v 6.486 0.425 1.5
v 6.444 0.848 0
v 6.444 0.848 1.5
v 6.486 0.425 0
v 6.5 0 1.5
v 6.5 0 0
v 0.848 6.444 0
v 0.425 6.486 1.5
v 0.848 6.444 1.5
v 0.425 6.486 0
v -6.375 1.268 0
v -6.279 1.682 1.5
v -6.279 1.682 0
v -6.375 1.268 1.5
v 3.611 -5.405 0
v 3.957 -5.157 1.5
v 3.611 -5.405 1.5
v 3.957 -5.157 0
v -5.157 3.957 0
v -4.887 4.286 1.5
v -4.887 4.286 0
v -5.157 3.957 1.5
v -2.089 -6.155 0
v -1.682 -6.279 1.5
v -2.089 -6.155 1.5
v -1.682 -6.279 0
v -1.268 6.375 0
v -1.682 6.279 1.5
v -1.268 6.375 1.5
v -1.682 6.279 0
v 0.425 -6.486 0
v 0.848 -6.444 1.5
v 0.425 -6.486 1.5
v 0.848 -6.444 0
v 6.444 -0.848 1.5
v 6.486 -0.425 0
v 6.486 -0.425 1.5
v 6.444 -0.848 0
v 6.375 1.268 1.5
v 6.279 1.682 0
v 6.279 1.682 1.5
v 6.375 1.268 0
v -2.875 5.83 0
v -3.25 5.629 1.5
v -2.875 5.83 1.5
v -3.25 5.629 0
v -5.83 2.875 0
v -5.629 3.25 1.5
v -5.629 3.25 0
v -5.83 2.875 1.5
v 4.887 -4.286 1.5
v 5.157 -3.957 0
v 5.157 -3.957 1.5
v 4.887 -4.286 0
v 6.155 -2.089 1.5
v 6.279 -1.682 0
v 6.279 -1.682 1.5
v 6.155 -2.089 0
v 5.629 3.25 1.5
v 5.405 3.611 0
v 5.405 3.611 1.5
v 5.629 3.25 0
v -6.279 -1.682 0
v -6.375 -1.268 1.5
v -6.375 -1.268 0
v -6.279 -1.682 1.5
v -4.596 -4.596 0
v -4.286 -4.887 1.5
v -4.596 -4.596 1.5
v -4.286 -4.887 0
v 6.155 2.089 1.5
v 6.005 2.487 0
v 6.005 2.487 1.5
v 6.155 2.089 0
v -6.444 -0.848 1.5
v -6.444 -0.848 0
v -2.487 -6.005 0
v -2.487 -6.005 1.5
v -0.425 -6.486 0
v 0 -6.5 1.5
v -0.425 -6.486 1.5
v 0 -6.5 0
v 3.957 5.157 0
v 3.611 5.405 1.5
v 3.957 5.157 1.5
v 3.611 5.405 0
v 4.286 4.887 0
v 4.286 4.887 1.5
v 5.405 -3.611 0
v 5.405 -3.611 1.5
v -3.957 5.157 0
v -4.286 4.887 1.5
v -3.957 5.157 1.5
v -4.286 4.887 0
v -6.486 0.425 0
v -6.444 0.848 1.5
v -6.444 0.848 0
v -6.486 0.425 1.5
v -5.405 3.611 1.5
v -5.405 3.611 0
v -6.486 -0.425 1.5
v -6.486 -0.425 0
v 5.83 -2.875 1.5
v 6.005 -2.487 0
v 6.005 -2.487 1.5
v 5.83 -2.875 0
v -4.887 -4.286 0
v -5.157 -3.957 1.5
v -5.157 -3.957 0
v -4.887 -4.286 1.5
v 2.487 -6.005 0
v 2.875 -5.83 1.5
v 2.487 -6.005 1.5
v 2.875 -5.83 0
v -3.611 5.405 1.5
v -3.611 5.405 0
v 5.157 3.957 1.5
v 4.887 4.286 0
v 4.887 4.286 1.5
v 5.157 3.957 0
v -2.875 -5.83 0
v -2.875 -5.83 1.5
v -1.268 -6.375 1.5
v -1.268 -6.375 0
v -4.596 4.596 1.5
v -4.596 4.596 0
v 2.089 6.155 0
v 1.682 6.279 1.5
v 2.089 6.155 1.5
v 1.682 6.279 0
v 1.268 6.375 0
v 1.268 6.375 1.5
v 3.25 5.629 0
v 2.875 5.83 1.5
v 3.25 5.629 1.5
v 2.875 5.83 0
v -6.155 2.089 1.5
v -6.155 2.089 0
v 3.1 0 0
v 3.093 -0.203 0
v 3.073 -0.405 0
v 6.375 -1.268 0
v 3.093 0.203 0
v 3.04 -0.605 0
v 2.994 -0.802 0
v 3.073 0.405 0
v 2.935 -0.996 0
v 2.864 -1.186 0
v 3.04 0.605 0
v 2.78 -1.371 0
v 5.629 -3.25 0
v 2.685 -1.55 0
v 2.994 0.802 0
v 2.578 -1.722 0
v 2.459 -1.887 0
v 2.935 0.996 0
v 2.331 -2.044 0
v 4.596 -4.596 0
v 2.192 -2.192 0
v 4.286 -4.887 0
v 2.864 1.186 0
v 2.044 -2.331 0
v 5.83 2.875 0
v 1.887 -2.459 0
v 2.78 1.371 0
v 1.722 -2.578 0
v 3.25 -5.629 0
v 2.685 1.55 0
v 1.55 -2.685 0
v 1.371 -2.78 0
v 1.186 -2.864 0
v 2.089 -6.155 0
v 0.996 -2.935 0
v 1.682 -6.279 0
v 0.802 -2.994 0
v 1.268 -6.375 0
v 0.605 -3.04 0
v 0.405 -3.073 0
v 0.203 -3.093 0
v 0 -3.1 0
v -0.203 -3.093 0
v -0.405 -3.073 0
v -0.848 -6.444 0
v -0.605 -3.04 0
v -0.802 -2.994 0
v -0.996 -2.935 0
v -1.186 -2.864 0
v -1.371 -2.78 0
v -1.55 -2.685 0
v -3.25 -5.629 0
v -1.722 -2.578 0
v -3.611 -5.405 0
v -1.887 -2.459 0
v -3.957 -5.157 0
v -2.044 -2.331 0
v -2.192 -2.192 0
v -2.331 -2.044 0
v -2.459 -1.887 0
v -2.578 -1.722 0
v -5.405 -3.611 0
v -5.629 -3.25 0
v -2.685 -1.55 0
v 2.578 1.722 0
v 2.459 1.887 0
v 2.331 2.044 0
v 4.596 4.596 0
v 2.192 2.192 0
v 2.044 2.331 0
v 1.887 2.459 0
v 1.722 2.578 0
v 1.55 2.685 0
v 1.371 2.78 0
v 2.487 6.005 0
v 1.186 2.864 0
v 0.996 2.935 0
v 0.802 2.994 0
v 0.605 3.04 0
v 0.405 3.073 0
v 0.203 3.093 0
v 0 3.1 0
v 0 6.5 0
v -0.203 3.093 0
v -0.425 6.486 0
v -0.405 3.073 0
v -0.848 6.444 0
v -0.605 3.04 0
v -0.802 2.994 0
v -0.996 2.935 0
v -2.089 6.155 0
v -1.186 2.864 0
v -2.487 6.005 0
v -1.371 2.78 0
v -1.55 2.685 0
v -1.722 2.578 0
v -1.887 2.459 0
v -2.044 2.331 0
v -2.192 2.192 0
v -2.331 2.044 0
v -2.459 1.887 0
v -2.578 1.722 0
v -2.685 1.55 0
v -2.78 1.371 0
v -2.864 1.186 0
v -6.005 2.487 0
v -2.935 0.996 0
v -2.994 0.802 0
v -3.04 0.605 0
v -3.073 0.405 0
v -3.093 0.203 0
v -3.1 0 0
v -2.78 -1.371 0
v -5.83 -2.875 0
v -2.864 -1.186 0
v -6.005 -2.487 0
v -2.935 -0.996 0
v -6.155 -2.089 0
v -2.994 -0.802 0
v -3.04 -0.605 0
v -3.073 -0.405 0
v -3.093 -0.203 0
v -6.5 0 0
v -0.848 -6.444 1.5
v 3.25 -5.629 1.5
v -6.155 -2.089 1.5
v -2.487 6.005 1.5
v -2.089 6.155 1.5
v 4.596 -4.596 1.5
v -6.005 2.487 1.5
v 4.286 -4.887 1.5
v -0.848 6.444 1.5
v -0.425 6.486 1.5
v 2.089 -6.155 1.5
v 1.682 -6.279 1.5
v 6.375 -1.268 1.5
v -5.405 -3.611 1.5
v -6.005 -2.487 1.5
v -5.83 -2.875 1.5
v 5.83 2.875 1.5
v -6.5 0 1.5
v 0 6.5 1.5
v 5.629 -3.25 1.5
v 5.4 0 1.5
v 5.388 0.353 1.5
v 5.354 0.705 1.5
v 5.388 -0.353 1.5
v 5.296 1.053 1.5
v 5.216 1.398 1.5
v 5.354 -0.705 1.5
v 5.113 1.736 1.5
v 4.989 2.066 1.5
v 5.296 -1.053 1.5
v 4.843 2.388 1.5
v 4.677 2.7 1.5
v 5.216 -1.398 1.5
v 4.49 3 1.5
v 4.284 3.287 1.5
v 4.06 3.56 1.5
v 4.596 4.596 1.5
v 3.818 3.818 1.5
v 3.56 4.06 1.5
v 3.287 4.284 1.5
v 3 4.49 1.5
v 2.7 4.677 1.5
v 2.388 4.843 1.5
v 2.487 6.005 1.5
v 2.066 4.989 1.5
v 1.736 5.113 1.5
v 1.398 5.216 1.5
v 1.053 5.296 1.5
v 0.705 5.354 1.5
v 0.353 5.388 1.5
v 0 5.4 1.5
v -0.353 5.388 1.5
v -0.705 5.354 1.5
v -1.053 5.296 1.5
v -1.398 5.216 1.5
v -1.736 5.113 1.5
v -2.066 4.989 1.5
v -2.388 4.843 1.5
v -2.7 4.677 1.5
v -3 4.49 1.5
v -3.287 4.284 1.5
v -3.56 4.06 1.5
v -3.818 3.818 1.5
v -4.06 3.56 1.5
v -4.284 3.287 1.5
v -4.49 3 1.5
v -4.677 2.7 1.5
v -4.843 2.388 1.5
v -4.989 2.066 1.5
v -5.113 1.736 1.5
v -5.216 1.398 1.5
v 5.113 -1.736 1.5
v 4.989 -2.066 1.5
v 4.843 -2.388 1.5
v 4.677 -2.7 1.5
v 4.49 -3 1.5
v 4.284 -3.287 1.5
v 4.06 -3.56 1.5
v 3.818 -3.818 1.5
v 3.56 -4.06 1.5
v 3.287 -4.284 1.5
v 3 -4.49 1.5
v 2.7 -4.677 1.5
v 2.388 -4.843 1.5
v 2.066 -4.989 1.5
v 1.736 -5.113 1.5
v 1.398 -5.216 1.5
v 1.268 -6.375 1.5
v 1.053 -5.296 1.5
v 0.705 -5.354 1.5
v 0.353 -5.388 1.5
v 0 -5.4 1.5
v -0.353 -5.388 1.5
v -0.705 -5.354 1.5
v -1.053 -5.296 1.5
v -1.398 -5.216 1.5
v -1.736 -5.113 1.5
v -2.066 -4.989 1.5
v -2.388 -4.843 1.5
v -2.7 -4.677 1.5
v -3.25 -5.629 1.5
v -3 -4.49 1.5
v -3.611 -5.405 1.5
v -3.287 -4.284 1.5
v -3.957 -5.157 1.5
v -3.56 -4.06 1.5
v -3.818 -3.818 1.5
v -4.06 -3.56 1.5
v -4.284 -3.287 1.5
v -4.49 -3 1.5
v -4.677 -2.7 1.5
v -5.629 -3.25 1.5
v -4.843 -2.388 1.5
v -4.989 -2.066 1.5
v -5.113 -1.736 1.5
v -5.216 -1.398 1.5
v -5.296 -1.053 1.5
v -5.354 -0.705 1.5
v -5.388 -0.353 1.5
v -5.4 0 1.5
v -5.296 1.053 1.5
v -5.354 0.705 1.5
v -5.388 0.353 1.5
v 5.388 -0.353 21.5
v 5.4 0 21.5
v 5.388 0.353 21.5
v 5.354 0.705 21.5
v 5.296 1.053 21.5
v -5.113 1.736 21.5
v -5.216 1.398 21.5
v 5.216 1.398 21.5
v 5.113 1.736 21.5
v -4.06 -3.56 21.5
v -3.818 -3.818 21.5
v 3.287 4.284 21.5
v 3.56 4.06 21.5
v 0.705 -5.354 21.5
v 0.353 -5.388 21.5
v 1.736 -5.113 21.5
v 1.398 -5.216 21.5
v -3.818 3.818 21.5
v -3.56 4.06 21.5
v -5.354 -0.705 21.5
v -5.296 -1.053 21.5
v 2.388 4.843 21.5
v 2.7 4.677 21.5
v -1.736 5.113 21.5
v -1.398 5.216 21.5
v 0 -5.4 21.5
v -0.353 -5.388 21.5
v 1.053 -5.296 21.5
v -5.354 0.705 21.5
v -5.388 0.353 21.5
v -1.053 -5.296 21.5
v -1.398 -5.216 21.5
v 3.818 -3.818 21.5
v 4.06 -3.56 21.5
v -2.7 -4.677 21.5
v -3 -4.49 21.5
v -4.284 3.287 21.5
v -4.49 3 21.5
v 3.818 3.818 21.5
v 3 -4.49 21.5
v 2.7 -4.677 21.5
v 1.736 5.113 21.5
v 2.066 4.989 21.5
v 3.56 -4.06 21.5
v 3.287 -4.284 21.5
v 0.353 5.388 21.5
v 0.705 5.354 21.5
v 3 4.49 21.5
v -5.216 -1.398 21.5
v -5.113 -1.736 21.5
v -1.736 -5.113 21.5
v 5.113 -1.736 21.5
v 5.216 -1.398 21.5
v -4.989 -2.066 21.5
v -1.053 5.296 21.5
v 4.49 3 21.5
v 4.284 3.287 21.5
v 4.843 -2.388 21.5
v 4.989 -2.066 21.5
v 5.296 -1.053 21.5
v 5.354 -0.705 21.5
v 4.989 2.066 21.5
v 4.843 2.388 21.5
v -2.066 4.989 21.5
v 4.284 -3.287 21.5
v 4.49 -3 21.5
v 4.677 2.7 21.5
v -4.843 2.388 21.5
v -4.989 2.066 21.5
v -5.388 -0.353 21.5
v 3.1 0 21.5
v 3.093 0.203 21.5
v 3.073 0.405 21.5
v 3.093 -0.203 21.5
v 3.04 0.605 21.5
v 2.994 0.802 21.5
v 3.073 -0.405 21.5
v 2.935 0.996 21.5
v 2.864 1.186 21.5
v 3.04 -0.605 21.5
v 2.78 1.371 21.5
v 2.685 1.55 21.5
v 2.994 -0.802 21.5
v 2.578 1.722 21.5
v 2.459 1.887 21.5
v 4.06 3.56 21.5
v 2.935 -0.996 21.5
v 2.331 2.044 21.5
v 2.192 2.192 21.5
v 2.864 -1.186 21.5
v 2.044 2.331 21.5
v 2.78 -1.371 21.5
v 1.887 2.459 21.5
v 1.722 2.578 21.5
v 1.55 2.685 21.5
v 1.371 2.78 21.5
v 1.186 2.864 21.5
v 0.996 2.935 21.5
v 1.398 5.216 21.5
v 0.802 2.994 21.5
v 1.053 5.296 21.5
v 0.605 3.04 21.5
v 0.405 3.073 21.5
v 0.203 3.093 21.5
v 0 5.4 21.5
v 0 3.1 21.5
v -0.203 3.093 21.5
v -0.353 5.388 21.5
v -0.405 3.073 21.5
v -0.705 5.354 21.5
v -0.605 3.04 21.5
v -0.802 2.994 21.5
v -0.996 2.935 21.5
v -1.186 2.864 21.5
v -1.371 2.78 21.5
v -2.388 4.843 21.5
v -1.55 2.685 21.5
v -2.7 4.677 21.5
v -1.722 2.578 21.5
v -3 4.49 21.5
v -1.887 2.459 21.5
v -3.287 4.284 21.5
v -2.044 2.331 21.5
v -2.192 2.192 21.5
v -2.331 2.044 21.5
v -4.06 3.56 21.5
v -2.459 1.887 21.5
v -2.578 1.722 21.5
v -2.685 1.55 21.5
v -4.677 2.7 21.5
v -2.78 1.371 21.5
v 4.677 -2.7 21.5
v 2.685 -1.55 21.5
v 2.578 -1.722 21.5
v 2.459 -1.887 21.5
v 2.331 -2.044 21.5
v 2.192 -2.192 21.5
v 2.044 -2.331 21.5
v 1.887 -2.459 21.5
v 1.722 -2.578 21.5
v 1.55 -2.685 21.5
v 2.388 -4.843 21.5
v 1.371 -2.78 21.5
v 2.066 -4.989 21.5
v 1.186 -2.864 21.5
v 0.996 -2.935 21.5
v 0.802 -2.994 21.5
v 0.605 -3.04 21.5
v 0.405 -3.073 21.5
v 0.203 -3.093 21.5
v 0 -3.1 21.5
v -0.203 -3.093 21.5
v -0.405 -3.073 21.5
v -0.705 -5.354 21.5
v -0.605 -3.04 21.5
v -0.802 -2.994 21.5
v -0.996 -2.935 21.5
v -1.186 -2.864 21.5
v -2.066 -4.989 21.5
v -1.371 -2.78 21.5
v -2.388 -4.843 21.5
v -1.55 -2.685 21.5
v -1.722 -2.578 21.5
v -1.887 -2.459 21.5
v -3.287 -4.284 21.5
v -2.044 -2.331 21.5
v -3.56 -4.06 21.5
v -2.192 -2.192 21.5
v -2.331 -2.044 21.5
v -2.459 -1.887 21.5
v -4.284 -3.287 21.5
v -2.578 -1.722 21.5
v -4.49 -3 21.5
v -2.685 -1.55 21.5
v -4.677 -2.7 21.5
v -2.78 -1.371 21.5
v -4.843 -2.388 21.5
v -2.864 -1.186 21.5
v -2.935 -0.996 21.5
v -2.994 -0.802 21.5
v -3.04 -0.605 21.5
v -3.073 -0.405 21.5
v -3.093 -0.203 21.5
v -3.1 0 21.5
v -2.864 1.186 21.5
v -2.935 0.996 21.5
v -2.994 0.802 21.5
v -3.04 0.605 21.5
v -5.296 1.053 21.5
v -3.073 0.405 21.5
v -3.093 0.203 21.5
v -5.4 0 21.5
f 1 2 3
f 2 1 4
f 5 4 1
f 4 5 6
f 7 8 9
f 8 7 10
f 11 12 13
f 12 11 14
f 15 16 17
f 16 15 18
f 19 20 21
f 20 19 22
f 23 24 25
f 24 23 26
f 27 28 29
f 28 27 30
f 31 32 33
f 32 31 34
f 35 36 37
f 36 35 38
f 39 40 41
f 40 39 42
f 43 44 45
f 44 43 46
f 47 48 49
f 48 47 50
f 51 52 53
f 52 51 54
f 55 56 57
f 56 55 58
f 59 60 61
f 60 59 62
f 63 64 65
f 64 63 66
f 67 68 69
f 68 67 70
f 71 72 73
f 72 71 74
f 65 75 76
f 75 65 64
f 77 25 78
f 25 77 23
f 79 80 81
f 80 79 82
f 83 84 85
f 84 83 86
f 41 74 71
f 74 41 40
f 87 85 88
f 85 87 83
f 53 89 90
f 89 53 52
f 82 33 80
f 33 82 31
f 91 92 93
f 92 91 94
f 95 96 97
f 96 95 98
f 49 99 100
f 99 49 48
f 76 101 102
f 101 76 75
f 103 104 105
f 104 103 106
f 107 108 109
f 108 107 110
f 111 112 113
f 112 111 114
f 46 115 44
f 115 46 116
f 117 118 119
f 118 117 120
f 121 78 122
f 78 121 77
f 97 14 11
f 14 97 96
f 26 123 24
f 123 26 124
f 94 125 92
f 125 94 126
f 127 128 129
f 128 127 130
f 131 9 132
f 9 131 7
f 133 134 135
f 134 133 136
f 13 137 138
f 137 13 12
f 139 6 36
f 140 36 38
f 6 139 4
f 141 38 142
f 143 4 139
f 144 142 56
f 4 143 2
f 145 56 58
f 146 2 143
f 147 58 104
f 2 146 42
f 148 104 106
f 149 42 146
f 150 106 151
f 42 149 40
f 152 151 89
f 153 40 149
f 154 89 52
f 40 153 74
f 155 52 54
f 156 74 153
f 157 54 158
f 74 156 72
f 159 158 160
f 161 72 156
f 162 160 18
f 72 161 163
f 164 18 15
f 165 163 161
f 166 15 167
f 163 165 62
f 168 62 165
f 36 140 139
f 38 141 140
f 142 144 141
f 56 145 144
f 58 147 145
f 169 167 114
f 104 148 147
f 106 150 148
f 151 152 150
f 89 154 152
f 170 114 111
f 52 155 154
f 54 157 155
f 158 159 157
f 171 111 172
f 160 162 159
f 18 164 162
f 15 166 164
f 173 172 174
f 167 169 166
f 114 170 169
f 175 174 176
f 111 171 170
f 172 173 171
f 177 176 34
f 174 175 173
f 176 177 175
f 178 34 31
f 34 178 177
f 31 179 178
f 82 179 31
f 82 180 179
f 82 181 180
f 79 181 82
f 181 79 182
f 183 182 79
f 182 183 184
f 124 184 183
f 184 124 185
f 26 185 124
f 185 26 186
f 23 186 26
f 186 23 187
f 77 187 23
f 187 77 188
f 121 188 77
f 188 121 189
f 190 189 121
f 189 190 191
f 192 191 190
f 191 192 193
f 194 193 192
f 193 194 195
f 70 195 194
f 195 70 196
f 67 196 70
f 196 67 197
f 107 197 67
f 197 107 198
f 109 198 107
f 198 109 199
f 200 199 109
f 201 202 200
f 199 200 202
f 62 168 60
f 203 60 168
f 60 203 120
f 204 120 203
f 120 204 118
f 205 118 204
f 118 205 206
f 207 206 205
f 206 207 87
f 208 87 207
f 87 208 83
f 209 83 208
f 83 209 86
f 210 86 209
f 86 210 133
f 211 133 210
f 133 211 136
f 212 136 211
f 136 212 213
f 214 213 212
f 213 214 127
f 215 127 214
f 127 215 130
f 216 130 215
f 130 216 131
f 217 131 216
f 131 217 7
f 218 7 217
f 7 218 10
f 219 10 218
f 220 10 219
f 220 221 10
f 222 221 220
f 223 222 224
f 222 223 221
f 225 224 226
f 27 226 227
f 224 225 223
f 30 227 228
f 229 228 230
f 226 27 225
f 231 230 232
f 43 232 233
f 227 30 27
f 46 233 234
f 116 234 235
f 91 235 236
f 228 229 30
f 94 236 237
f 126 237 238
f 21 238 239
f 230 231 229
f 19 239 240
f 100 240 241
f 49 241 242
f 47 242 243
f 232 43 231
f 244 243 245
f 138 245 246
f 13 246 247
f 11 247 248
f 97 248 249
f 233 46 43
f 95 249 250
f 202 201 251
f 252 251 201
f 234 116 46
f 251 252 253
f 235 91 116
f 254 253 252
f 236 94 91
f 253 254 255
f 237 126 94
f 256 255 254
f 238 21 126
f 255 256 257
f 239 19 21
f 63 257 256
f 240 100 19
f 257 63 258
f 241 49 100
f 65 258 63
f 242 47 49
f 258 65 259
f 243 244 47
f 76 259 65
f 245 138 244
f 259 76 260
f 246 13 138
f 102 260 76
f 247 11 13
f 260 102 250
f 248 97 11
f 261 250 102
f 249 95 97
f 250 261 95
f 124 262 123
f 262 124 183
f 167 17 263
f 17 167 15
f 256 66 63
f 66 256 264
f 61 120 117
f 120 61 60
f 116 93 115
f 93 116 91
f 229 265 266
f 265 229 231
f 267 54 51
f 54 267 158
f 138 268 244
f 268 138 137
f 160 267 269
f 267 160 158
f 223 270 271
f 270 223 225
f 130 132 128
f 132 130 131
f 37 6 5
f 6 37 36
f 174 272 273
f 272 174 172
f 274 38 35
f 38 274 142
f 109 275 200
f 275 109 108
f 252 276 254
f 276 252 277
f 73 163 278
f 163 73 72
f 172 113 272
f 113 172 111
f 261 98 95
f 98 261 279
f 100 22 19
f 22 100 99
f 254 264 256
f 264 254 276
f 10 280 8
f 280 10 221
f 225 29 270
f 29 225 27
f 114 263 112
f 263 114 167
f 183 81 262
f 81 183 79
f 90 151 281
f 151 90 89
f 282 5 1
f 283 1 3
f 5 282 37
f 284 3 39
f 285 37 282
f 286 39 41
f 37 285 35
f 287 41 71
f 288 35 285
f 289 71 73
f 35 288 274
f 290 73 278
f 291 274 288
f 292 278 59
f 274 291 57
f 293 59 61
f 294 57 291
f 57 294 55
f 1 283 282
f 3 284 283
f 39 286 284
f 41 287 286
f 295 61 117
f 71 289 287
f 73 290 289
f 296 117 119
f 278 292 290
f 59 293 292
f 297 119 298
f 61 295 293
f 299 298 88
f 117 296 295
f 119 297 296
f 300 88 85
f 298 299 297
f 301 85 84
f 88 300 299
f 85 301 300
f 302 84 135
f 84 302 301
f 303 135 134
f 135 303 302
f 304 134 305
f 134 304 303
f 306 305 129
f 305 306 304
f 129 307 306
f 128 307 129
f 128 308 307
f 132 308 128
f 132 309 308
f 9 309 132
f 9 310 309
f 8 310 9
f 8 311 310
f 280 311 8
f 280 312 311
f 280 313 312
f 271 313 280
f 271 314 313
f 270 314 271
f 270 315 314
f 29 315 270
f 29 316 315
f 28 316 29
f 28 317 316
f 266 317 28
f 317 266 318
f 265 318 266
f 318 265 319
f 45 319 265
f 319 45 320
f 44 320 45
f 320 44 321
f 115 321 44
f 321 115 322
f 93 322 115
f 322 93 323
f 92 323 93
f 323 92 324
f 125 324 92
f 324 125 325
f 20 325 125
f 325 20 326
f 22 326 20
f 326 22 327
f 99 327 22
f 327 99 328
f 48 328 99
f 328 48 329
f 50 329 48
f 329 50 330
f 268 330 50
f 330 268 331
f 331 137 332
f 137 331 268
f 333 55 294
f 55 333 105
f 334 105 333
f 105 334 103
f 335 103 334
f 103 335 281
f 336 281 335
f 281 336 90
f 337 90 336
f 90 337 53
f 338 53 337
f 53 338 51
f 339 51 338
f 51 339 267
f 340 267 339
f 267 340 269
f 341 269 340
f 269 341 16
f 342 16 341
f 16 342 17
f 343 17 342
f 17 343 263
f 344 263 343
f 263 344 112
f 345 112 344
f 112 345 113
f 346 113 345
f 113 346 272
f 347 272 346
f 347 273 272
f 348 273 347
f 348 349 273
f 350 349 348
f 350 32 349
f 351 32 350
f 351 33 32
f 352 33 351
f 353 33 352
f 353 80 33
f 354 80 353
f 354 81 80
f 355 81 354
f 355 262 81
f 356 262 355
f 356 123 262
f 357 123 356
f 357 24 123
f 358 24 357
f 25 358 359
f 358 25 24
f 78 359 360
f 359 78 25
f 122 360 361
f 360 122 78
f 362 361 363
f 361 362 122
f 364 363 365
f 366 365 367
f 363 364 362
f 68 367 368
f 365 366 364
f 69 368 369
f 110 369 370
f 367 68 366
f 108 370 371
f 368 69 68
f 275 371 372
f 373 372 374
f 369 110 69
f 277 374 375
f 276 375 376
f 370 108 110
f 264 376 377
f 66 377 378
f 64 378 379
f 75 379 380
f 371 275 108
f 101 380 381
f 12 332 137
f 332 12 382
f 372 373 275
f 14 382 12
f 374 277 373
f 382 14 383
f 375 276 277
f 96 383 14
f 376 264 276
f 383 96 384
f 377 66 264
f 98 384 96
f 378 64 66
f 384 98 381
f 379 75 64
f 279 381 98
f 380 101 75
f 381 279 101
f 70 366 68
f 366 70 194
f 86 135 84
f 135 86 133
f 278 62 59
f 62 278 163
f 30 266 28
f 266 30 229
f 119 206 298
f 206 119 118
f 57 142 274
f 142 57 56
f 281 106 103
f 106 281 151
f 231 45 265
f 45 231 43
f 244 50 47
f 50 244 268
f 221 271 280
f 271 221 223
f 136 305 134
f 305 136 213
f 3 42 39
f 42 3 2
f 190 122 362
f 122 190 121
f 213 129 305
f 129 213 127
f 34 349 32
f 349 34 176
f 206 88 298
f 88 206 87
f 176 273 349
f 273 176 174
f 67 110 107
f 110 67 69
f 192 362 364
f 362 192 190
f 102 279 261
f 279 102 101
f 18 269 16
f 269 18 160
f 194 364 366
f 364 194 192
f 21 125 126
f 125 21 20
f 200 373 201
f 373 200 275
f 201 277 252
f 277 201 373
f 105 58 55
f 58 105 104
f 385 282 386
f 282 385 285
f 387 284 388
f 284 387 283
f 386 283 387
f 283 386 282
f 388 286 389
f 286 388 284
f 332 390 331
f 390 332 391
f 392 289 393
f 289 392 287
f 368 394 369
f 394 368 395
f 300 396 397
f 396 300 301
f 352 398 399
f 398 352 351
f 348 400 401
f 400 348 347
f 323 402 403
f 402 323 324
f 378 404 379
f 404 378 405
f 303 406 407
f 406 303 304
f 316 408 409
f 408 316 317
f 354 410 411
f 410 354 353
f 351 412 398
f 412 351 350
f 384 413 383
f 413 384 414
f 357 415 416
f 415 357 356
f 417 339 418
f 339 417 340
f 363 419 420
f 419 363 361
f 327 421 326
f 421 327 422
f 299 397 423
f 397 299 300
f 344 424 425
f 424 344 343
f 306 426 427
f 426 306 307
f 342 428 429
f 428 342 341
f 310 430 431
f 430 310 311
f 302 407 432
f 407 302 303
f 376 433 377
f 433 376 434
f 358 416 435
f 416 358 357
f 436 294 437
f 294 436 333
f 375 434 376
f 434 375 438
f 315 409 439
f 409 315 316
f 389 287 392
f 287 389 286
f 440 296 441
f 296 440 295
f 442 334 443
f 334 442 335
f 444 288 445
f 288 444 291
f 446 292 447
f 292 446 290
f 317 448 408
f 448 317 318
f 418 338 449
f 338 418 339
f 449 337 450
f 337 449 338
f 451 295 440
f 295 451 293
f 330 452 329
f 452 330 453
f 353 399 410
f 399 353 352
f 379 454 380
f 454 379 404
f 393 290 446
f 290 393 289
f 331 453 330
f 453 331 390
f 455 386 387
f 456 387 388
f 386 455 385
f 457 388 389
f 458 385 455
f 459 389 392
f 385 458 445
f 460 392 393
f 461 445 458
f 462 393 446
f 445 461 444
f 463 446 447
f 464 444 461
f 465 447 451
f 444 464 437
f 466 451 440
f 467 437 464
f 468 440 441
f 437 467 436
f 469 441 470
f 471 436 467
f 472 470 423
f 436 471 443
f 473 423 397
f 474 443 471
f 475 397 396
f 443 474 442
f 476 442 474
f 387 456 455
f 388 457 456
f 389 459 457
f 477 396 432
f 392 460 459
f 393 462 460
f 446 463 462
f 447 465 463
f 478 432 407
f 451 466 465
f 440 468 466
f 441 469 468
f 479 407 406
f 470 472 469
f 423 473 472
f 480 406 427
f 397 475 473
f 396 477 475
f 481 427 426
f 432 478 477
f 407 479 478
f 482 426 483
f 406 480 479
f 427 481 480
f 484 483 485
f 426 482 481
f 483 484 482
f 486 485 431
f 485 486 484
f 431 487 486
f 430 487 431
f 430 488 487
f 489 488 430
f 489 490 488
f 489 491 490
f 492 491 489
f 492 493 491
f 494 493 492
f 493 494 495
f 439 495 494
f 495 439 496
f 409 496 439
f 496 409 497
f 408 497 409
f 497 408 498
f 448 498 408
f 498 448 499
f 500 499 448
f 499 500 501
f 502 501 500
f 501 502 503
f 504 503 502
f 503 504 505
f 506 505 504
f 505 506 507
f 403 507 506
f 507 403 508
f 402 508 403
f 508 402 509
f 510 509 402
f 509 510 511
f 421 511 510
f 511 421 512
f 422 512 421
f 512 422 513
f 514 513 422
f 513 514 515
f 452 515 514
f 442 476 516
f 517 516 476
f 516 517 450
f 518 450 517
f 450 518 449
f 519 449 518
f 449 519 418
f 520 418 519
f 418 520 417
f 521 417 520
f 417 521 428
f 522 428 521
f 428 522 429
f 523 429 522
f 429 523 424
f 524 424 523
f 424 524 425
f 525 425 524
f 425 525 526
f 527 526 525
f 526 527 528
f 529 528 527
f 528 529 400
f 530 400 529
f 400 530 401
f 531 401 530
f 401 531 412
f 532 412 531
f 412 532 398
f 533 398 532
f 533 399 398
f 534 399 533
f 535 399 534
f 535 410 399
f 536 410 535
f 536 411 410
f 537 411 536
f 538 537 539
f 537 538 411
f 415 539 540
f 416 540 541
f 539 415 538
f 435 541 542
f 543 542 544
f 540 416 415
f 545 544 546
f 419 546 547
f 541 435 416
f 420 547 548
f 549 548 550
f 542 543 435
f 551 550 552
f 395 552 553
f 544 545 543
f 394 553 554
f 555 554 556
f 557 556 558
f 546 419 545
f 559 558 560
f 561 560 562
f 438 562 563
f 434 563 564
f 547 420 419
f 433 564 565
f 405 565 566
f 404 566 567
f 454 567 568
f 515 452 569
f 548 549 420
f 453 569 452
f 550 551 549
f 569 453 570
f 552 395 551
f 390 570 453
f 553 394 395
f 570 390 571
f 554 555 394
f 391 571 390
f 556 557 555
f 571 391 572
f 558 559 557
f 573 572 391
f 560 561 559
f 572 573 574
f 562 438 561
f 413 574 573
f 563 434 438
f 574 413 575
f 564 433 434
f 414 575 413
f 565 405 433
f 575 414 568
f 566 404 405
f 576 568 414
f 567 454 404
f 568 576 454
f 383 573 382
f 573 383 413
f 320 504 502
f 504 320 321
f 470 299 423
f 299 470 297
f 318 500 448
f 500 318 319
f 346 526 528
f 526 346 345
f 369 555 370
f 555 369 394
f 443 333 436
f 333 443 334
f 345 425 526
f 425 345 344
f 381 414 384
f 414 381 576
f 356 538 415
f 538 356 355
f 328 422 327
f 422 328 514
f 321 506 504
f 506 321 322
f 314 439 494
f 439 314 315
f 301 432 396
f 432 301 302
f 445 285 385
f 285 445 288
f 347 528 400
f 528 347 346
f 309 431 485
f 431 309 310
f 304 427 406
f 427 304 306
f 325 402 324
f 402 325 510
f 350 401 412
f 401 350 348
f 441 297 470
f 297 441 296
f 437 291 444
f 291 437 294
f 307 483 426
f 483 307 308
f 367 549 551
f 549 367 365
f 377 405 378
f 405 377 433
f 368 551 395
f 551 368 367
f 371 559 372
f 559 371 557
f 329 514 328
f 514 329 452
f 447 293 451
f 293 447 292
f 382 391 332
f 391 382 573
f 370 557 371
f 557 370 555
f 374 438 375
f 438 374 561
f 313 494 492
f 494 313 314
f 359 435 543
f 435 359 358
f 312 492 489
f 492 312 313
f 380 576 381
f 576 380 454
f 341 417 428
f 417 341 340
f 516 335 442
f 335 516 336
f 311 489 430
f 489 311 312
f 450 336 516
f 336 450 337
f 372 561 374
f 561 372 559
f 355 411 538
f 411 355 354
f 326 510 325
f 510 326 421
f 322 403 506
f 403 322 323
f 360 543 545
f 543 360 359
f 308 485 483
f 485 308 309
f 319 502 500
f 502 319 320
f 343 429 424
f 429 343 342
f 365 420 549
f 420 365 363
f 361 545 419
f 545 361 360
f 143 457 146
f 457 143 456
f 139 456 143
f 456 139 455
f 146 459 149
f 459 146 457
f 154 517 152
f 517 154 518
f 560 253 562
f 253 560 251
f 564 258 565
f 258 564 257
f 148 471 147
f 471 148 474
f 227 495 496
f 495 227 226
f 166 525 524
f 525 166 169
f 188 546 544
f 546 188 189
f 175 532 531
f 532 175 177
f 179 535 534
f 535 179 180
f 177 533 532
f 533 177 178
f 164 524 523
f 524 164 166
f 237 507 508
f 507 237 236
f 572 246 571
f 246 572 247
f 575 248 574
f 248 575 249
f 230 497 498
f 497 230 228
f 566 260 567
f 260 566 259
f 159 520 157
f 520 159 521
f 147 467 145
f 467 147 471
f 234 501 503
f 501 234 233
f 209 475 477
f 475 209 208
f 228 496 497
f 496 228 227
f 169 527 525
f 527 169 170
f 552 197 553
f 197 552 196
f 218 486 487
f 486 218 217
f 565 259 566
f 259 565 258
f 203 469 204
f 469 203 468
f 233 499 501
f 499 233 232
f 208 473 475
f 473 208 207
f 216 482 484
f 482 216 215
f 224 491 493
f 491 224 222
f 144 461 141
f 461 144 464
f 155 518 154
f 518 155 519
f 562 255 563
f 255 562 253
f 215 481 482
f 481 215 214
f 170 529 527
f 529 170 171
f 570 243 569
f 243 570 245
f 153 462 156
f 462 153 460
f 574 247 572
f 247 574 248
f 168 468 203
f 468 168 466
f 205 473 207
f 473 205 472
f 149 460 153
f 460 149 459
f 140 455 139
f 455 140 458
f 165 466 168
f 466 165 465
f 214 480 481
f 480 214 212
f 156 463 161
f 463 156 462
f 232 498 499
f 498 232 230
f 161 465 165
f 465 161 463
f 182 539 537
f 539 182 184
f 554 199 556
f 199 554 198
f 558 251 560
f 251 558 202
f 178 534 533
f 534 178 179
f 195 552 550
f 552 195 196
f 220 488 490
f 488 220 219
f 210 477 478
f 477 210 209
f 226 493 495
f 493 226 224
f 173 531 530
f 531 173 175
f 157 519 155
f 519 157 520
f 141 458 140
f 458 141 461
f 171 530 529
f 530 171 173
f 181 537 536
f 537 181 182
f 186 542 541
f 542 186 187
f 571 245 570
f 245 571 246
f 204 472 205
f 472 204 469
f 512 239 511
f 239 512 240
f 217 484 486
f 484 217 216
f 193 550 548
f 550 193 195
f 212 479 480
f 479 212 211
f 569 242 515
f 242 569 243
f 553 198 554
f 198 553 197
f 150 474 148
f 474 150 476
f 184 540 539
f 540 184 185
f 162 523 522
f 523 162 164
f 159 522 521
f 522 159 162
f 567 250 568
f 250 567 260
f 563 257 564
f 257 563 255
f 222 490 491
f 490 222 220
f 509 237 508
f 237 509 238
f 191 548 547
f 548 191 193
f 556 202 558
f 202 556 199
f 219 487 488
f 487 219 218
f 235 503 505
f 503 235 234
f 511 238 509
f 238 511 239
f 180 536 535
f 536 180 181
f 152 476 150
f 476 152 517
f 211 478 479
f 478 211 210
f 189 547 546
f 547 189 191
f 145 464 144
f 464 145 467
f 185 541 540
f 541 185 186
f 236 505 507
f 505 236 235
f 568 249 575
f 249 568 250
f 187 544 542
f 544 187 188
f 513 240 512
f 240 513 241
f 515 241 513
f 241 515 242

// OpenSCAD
// PCR tube adapter sleeve - 0.2 mL tube in 1.5 mL rack hole
// Print orientation: collar down on bed (z = 0), sleeve up (+Z)

$fn = 96;

// --- Dimensions (mm) ---
collar_d      = 13;    // collar diameter
collar_h      = 1.5;   // collar thickness (z = 0 to 1.5)
sleeve_od     = 10.8;  // sleeve outer diameter
sleeve_top_z  = 21.5;  // top of sleeve
bore_d        = 6.2;   // through-bore diameter
eps           = 0.5;   // cutter overshoot

difference() {
    union() {
        // Collar
        cylinder(d = collar_d, h = collar_h);
        // Sleeve body (overlaps collar slightly for a clean union)
        translate([0, 0, collar_h - 0.01])
            cylinder(d = sleeve_od, h = sleeve_top_z - collar_h + 0.01);
    }
    // Full-height bore
    translate([0, 0, -eps])
        cylinder(d = bore_d, h = sleeve_top_z + 2 * eps);
}
